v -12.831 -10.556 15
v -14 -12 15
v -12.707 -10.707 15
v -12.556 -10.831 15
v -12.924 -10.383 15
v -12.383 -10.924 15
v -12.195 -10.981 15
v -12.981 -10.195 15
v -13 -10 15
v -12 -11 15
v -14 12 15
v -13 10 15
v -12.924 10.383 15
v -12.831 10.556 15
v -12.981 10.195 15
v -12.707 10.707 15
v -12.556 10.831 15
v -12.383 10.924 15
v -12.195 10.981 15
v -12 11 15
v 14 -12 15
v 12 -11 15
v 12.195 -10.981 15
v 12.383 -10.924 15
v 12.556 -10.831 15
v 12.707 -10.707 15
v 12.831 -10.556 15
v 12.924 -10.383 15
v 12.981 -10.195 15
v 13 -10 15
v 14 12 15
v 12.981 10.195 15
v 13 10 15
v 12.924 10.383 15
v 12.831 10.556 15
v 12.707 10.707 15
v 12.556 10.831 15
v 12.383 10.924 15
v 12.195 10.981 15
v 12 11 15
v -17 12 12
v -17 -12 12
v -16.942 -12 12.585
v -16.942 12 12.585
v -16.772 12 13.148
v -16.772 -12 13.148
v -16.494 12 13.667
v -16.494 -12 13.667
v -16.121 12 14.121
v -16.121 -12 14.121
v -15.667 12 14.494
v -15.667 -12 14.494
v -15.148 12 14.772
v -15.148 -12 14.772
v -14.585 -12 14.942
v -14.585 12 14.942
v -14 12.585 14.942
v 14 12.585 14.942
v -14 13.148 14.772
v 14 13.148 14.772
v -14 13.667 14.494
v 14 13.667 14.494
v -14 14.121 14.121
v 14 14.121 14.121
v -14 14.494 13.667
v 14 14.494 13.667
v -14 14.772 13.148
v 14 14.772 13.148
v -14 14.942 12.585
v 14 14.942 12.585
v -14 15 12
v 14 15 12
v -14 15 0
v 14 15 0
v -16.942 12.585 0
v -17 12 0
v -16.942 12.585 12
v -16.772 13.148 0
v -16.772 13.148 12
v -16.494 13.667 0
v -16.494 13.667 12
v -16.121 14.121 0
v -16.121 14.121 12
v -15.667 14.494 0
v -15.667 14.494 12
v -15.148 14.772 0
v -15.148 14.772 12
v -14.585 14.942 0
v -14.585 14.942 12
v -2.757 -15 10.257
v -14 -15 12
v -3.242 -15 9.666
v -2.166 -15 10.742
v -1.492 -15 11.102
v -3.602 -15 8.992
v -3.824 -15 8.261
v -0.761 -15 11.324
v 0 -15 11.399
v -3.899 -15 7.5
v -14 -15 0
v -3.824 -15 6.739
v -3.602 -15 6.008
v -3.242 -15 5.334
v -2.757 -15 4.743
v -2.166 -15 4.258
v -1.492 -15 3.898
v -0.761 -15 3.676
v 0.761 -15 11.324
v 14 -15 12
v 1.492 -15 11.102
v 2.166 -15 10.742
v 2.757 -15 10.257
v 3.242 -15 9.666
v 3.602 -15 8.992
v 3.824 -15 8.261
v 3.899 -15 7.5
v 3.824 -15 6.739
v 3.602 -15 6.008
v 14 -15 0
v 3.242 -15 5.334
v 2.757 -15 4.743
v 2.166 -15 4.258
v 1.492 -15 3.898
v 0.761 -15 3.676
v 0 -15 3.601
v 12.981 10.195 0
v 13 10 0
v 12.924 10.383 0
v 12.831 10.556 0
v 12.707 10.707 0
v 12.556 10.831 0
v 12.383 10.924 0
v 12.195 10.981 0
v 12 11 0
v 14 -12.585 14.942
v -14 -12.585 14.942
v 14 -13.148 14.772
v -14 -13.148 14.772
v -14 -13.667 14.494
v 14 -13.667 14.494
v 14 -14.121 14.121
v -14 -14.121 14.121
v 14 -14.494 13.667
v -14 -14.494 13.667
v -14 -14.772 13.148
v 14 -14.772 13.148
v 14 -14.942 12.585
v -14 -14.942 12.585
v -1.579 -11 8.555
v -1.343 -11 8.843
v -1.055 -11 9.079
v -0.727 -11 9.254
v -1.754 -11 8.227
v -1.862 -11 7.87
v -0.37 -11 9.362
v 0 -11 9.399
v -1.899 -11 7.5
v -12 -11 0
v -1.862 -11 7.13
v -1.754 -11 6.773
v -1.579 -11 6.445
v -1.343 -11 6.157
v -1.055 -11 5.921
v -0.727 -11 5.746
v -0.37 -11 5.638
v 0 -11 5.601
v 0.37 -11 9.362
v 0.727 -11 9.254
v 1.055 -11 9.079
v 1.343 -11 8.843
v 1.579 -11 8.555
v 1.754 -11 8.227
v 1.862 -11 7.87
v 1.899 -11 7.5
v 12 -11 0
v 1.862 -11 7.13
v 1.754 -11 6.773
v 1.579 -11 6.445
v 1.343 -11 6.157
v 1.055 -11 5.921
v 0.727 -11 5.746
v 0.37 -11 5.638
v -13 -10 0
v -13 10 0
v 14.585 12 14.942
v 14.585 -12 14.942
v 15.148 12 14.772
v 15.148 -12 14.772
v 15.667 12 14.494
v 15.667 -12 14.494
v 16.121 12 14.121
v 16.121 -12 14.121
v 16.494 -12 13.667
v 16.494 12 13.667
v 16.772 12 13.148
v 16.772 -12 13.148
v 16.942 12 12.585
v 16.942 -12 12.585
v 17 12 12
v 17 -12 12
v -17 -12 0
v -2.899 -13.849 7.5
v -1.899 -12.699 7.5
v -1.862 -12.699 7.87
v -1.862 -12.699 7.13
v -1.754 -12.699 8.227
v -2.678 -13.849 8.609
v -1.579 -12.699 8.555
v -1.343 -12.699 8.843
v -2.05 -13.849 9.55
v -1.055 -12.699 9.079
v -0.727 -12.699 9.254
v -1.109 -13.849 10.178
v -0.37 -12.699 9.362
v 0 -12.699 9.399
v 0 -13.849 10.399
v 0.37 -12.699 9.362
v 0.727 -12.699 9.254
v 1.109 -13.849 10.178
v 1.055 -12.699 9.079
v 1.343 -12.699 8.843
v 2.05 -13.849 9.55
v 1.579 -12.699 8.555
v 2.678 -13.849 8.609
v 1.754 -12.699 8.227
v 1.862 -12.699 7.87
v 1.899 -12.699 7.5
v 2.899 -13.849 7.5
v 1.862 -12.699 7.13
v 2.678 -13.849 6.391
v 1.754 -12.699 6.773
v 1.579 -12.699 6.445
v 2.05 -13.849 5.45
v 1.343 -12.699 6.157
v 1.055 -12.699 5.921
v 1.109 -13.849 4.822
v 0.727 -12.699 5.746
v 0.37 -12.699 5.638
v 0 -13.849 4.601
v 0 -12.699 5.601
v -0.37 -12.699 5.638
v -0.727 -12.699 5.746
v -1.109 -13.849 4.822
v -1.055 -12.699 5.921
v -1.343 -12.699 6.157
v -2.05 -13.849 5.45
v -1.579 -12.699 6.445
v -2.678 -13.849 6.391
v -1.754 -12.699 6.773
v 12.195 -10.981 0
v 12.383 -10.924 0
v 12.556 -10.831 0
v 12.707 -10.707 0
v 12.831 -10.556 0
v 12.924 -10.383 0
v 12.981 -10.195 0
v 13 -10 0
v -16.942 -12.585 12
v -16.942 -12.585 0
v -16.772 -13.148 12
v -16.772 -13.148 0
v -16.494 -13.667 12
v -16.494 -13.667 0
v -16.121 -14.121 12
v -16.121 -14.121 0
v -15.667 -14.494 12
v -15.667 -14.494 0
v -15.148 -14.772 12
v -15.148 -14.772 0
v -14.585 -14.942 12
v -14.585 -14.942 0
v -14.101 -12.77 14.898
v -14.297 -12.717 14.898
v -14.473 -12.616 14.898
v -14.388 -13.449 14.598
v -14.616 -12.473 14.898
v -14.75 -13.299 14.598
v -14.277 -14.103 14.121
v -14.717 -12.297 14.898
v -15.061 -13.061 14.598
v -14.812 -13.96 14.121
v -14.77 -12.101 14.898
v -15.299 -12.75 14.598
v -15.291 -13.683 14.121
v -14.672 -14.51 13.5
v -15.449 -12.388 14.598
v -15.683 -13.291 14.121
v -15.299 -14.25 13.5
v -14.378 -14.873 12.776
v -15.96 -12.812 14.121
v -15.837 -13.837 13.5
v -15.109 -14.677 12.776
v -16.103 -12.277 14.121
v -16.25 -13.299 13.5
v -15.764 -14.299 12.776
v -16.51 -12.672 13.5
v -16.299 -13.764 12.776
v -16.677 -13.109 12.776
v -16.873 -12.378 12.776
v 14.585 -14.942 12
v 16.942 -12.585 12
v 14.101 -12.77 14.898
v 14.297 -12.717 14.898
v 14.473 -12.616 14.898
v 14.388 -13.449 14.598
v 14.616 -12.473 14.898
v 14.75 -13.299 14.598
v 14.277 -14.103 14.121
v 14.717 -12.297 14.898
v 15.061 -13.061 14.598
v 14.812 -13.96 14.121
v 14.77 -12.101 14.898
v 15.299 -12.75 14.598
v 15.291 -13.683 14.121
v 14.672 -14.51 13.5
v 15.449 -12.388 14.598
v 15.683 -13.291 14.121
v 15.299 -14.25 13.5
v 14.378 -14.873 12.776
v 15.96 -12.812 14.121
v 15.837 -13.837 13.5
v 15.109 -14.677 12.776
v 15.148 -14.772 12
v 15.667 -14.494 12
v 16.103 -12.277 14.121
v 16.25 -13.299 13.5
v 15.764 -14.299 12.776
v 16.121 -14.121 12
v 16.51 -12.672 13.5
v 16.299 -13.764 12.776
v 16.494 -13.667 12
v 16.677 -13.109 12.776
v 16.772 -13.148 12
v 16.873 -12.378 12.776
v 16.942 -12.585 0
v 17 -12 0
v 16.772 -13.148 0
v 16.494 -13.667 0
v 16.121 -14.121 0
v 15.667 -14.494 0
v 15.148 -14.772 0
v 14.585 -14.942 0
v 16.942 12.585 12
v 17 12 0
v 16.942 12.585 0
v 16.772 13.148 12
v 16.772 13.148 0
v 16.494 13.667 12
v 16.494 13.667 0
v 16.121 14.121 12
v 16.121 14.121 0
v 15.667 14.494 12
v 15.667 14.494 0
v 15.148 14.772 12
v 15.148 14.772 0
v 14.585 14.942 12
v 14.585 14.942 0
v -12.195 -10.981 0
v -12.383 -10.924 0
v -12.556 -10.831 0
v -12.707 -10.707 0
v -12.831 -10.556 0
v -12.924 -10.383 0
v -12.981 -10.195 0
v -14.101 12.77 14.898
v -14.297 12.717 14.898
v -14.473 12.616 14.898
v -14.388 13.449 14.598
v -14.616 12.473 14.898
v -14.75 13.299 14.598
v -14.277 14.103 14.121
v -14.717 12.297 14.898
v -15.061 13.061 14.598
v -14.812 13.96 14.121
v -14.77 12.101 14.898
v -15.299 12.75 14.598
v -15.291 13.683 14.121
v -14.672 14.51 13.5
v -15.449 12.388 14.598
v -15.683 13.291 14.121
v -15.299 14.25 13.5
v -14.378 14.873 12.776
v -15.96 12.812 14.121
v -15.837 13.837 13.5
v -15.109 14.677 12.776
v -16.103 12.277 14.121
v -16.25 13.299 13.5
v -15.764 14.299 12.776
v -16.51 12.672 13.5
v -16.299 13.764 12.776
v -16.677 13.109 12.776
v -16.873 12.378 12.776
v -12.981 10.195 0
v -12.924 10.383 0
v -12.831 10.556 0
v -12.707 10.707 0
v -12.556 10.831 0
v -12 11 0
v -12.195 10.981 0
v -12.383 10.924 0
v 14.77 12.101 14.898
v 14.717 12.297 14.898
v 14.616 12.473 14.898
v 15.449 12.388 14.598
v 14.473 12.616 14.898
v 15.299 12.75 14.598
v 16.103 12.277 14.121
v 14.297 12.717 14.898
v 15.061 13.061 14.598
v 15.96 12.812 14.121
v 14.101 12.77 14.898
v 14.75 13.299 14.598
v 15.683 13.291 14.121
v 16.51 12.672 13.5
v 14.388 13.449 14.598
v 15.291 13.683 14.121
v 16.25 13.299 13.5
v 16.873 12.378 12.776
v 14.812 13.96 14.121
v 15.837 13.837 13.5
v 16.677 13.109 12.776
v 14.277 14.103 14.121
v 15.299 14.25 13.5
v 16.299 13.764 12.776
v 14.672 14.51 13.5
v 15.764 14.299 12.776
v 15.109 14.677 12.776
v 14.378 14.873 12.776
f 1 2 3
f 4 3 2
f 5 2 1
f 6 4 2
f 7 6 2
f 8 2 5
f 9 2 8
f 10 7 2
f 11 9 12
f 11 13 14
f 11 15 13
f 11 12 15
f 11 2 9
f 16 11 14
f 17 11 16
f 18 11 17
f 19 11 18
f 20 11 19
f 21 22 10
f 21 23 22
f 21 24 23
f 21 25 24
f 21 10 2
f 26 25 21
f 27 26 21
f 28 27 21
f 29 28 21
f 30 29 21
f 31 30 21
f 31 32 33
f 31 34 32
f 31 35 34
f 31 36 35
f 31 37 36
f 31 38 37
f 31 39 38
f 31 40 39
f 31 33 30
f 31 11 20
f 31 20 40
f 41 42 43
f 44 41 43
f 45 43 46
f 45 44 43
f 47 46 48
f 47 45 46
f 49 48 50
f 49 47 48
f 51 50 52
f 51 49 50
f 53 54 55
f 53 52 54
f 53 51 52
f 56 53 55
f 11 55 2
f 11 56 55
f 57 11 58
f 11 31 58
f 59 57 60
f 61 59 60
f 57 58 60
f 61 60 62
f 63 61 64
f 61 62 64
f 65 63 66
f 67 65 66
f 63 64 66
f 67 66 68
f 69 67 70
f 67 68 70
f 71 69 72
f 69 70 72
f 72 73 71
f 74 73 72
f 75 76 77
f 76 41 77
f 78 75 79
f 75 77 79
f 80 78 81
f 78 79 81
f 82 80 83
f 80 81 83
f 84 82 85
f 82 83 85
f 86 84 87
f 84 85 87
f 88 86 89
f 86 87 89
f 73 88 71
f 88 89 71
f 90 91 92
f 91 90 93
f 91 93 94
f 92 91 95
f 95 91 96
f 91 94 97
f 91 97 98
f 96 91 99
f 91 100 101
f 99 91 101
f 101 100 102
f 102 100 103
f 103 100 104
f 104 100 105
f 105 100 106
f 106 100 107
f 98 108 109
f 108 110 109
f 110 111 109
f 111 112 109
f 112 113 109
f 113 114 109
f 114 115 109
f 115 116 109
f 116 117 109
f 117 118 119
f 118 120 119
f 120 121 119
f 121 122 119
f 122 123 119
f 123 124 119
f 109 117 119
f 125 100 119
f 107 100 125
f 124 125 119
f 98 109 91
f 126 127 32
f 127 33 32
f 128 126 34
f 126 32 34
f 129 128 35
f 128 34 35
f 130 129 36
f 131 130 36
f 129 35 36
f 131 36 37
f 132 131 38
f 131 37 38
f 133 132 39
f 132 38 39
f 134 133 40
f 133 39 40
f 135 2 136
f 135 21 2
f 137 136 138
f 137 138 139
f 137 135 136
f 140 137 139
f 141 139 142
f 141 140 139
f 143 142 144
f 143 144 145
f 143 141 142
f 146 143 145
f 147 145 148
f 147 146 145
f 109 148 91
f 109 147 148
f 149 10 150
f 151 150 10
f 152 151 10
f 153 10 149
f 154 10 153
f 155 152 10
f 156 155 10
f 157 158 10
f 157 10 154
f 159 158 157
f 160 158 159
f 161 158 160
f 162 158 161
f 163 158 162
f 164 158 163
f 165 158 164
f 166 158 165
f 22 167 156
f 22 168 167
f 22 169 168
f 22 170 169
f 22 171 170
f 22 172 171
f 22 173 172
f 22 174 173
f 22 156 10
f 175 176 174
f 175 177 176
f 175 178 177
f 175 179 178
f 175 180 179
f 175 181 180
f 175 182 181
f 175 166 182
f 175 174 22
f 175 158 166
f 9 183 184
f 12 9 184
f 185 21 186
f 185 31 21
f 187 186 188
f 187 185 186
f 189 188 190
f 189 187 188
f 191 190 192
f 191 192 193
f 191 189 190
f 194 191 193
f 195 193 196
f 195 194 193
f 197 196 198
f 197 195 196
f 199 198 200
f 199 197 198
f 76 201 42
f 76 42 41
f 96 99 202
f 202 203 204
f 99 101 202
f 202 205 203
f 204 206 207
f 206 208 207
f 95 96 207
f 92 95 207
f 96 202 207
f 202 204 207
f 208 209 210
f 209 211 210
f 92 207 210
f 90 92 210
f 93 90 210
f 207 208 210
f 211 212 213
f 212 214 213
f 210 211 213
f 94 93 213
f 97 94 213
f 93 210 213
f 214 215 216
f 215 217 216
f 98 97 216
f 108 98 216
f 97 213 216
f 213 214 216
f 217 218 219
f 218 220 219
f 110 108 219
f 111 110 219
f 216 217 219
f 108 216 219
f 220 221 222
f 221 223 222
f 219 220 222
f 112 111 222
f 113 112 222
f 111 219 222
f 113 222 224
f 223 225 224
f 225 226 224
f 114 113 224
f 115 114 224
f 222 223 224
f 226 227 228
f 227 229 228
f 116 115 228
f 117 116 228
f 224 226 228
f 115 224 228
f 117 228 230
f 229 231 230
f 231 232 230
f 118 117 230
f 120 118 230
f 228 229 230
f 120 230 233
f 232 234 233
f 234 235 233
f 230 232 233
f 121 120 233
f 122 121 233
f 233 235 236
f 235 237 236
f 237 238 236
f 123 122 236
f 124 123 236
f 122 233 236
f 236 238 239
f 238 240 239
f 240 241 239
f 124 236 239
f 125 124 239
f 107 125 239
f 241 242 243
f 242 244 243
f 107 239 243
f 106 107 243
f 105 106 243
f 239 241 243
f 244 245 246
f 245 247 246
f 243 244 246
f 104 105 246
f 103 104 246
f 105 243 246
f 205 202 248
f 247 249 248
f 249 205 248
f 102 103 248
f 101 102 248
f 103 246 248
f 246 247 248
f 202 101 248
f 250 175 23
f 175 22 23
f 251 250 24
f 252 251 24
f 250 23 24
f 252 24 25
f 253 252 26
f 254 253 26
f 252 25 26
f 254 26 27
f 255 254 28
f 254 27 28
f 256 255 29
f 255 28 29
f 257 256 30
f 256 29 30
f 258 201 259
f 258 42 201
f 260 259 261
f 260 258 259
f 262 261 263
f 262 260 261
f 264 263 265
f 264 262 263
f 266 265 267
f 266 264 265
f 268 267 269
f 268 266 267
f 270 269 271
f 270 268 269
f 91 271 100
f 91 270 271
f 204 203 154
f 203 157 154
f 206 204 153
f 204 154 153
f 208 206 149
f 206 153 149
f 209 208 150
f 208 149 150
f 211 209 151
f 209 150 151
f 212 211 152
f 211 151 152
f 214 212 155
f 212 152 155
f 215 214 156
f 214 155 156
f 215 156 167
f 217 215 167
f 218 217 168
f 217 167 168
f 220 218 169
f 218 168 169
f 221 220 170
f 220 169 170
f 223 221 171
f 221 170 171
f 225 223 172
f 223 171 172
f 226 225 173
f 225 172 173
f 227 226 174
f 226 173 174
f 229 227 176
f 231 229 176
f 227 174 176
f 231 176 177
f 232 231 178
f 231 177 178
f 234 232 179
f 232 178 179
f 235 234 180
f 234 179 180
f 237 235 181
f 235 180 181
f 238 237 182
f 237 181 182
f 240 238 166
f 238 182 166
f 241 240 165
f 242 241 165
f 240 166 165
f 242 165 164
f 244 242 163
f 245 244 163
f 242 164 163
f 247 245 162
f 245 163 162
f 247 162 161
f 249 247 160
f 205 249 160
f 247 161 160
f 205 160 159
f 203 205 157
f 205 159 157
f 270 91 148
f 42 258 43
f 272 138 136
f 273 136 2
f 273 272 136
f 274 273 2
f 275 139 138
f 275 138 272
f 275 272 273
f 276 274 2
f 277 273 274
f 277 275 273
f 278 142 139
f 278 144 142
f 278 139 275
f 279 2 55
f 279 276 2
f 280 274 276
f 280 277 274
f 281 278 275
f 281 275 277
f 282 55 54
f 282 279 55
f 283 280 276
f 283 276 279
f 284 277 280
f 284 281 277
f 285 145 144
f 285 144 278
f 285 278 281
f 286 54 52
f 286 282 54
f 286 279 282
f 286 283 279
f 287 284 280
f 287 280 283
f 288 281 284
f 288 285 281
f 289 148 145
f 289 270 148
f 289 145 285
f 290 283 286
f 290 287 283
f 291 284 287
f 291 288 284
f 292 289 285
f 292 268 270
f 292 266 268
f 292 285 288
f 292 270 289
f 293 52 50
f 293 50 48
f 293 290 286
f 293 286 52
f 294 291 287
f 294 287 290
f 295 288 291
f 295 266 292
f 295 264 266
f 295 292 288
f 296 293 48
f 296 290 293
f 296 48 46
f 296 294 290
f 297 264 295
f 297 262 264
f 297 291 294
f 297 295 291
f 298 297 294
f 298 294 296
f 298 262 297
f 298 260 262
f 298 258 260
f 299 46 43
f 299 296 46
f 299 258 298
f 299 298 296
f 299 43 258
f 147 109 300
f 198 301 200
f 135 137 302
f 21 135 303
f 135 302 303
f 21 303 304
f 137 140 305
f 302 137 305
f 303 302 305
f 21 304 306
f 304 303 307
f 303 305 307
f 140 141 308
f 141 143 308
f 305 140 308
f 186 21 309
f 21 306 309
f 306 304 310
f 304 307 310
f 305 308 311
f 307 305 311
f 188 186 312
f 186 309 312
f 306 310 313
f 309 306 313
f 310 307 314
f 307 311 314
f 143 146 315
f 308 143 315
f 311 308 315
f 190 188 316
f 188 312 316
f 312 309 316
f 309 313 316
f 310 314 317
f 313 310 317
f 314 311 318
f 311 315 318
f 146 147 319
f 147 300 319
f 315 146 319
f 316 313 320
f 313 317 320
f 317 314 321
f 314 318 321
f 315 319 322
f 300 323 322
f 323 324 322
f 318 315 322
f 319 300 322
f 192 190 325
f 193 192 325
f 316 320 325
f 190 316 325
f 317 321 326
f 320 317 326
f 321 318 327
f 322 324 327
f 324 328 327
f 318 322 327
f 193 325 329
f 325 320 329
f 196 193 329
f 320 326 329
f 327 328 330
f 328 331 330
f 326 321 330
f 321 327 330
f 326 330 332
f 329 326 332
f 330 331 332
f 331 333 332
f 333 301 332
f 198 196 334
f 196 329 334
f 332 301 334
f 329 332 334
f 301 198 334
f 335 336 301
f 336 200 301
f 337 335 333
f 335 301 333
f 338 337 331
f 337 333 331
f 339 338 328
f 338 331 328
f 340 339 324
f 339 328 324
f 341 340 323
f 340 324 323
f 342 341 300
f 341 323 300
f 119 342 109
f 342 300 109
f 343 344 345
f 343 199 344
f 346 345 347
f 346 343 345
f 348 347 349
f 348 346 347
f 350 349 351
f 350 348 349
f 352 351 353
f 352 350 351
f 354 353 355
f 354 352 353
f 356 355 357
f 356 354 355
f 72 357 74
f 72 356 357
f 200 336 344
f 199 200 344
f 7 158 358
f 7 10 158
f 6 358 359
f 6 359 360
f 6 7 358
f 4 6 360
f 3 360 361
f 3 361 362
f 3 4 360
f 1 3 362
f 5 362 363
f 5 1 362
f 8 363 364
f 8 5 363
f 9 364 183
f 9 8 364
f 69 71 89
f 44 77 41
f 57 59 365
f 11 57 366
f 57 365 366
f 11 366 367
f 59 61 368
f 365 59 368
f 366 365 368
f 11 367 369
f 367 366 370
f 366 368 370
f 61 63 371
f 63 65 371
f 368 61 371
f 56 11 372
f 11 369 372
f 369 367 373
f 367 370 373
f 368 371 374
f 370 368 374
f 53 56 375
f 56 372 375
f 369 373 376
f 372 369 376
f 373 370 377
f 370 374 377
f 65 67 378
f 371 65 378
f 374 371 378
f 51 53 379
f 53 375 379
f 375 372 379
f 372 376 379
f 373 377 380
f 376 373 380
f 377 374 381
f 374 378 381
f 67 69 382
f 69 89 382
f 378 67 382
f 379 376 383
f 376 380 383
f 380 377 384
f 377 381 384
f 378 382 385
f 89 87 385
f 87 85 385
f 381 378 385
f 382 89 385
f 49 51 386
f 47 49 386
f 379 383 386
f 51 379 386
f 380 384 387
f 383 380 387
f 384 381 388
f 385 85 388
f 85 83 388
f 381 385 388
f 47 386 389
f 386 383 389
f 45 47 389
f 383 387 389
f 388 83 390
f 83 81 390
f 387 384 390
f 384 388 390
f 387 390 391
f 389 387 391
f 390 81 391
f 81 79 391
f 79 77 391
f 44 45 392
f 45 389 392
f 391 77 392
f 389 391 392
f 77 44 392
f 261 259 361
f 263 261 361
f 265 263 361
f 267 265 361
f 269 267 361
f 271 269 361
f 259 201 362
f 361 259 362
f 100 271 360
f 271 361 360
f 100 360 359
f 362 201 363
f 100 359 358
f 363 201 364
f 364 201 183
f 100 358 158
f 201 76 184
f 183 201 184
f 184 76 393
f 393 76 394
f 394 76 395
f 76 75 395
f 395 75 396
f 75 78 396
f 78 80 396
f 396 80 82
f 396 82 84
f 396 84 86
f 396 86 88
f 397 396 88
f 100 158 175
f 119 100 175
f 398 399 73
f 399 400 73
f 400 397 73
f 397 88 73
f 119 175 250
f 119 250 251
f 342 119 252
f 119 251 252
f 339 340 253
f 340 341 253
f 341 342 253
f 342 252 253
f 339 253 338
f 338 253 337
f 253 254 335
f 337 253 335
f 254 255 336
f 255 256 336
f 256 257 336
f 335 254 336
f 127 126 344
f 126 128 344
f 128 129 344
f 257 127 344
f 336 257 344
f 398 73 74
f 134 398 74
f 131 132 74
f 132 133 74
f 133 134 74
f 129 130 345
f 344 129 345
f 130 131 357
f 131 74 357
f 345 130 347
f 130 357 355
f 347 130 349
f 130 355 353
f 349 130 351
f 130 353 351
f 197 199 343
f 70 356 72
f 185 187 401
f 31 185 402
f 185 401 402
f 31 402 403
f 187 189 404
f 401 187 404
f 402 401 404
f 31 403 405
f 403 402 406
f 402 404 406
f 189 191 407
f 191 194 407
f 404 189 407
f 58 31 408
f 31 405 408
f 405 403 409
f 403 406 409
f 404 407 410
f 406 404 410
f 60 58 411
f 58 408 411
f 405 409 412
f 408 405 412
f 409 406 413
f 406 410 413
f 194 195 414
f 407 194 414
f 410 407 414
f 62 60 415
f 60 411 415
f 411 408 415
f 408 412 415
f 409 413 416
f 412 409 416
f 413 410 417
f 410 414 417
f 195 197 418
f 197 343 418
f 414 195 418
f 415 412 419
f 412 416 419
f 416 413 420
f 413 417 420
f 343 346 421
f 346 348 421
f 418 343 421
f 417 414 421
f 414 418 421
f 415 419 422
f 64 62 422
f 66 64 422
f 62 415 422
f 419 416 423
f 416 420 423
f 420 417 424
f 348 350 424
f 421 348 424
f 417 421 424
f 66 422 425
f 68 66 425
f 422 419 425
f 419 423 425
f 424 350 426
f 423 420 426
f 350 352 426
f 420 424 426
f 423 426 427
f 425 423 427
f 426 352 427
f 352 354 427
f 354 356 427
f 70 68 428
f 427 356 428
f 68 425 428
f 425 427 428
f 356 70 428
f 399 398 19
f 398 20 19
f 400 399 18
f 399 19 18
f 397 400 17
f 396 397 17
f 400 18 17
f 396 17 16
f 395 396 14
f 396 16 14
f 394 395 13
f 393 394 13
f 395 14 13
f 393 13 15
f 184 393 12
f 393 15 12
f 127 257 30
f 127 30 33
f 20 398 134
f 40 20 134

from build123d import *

# Parameters (mm, degrees)
F0_W           = 34
F0_H           = 30
F0_W_2         = 26
F0_H_2         = 22
F1_DEPTH       = 15
F3_D           = 3.7973
F3_DEPTH       = 5
F3_CSINK_D     = 7.7978
F3_CSINK_ANGLE = 82
F3_TIP         = 1.1408240143
F4_R           = 3
F5_R           = 1


with BuildPart() as f1:
    # F0 (on Top) → F1 (new body)
    with BuildSketch(Plane.XY):
        Rectangle(F0_W, F0_H)
        Rectangle(F0_W_2, F0_H_2, mode=Mode.SUBTRACT)
    extrude(amount=F1_DEPTH)

    # F3
    with Locations(Plane.XZ.offset(15)):
        with Locations((0, 7.5)):
            CounterSinkHole(F3_D / 2, F3_CSINK_D / 2, depth=F3_DEPTH, counter_sink_angle=F3_CSINK_ANGLE)
            with Locations((0, 0, -(F3_DEPTH + F3_TIP / 2))):  # 118° drill point
                Cone(0, F3_D / 2, F3_TIP, mode=Mode.SUBTRACT)

    # F4
    f4_edges = [f1.edges().sort_by_distance(p)[0] for p in [
        (-17, -15, 7.5),
        (17, -15, 7.5),
        (17, 15, 7.5),
        (-17, 15, 7.5),
        (0, -15, 15),
        (17, 0, 15),
        (0, 15, 15),
        (-17, 0, 15),
    ]]
    fillet(f4_edges, radius=F4_R)

    # F5
    f5_edges = [f1.edges().sort_by_distance(p)[0] for p in [
        (-13, -11, 7.5),
        (-13, 11, 7.5),
        (13, 11, 7.5),
        (13, -11, 7.5),
    ]]
    fillet(f5_edges, radius=F5_R)


solid = f1.part
